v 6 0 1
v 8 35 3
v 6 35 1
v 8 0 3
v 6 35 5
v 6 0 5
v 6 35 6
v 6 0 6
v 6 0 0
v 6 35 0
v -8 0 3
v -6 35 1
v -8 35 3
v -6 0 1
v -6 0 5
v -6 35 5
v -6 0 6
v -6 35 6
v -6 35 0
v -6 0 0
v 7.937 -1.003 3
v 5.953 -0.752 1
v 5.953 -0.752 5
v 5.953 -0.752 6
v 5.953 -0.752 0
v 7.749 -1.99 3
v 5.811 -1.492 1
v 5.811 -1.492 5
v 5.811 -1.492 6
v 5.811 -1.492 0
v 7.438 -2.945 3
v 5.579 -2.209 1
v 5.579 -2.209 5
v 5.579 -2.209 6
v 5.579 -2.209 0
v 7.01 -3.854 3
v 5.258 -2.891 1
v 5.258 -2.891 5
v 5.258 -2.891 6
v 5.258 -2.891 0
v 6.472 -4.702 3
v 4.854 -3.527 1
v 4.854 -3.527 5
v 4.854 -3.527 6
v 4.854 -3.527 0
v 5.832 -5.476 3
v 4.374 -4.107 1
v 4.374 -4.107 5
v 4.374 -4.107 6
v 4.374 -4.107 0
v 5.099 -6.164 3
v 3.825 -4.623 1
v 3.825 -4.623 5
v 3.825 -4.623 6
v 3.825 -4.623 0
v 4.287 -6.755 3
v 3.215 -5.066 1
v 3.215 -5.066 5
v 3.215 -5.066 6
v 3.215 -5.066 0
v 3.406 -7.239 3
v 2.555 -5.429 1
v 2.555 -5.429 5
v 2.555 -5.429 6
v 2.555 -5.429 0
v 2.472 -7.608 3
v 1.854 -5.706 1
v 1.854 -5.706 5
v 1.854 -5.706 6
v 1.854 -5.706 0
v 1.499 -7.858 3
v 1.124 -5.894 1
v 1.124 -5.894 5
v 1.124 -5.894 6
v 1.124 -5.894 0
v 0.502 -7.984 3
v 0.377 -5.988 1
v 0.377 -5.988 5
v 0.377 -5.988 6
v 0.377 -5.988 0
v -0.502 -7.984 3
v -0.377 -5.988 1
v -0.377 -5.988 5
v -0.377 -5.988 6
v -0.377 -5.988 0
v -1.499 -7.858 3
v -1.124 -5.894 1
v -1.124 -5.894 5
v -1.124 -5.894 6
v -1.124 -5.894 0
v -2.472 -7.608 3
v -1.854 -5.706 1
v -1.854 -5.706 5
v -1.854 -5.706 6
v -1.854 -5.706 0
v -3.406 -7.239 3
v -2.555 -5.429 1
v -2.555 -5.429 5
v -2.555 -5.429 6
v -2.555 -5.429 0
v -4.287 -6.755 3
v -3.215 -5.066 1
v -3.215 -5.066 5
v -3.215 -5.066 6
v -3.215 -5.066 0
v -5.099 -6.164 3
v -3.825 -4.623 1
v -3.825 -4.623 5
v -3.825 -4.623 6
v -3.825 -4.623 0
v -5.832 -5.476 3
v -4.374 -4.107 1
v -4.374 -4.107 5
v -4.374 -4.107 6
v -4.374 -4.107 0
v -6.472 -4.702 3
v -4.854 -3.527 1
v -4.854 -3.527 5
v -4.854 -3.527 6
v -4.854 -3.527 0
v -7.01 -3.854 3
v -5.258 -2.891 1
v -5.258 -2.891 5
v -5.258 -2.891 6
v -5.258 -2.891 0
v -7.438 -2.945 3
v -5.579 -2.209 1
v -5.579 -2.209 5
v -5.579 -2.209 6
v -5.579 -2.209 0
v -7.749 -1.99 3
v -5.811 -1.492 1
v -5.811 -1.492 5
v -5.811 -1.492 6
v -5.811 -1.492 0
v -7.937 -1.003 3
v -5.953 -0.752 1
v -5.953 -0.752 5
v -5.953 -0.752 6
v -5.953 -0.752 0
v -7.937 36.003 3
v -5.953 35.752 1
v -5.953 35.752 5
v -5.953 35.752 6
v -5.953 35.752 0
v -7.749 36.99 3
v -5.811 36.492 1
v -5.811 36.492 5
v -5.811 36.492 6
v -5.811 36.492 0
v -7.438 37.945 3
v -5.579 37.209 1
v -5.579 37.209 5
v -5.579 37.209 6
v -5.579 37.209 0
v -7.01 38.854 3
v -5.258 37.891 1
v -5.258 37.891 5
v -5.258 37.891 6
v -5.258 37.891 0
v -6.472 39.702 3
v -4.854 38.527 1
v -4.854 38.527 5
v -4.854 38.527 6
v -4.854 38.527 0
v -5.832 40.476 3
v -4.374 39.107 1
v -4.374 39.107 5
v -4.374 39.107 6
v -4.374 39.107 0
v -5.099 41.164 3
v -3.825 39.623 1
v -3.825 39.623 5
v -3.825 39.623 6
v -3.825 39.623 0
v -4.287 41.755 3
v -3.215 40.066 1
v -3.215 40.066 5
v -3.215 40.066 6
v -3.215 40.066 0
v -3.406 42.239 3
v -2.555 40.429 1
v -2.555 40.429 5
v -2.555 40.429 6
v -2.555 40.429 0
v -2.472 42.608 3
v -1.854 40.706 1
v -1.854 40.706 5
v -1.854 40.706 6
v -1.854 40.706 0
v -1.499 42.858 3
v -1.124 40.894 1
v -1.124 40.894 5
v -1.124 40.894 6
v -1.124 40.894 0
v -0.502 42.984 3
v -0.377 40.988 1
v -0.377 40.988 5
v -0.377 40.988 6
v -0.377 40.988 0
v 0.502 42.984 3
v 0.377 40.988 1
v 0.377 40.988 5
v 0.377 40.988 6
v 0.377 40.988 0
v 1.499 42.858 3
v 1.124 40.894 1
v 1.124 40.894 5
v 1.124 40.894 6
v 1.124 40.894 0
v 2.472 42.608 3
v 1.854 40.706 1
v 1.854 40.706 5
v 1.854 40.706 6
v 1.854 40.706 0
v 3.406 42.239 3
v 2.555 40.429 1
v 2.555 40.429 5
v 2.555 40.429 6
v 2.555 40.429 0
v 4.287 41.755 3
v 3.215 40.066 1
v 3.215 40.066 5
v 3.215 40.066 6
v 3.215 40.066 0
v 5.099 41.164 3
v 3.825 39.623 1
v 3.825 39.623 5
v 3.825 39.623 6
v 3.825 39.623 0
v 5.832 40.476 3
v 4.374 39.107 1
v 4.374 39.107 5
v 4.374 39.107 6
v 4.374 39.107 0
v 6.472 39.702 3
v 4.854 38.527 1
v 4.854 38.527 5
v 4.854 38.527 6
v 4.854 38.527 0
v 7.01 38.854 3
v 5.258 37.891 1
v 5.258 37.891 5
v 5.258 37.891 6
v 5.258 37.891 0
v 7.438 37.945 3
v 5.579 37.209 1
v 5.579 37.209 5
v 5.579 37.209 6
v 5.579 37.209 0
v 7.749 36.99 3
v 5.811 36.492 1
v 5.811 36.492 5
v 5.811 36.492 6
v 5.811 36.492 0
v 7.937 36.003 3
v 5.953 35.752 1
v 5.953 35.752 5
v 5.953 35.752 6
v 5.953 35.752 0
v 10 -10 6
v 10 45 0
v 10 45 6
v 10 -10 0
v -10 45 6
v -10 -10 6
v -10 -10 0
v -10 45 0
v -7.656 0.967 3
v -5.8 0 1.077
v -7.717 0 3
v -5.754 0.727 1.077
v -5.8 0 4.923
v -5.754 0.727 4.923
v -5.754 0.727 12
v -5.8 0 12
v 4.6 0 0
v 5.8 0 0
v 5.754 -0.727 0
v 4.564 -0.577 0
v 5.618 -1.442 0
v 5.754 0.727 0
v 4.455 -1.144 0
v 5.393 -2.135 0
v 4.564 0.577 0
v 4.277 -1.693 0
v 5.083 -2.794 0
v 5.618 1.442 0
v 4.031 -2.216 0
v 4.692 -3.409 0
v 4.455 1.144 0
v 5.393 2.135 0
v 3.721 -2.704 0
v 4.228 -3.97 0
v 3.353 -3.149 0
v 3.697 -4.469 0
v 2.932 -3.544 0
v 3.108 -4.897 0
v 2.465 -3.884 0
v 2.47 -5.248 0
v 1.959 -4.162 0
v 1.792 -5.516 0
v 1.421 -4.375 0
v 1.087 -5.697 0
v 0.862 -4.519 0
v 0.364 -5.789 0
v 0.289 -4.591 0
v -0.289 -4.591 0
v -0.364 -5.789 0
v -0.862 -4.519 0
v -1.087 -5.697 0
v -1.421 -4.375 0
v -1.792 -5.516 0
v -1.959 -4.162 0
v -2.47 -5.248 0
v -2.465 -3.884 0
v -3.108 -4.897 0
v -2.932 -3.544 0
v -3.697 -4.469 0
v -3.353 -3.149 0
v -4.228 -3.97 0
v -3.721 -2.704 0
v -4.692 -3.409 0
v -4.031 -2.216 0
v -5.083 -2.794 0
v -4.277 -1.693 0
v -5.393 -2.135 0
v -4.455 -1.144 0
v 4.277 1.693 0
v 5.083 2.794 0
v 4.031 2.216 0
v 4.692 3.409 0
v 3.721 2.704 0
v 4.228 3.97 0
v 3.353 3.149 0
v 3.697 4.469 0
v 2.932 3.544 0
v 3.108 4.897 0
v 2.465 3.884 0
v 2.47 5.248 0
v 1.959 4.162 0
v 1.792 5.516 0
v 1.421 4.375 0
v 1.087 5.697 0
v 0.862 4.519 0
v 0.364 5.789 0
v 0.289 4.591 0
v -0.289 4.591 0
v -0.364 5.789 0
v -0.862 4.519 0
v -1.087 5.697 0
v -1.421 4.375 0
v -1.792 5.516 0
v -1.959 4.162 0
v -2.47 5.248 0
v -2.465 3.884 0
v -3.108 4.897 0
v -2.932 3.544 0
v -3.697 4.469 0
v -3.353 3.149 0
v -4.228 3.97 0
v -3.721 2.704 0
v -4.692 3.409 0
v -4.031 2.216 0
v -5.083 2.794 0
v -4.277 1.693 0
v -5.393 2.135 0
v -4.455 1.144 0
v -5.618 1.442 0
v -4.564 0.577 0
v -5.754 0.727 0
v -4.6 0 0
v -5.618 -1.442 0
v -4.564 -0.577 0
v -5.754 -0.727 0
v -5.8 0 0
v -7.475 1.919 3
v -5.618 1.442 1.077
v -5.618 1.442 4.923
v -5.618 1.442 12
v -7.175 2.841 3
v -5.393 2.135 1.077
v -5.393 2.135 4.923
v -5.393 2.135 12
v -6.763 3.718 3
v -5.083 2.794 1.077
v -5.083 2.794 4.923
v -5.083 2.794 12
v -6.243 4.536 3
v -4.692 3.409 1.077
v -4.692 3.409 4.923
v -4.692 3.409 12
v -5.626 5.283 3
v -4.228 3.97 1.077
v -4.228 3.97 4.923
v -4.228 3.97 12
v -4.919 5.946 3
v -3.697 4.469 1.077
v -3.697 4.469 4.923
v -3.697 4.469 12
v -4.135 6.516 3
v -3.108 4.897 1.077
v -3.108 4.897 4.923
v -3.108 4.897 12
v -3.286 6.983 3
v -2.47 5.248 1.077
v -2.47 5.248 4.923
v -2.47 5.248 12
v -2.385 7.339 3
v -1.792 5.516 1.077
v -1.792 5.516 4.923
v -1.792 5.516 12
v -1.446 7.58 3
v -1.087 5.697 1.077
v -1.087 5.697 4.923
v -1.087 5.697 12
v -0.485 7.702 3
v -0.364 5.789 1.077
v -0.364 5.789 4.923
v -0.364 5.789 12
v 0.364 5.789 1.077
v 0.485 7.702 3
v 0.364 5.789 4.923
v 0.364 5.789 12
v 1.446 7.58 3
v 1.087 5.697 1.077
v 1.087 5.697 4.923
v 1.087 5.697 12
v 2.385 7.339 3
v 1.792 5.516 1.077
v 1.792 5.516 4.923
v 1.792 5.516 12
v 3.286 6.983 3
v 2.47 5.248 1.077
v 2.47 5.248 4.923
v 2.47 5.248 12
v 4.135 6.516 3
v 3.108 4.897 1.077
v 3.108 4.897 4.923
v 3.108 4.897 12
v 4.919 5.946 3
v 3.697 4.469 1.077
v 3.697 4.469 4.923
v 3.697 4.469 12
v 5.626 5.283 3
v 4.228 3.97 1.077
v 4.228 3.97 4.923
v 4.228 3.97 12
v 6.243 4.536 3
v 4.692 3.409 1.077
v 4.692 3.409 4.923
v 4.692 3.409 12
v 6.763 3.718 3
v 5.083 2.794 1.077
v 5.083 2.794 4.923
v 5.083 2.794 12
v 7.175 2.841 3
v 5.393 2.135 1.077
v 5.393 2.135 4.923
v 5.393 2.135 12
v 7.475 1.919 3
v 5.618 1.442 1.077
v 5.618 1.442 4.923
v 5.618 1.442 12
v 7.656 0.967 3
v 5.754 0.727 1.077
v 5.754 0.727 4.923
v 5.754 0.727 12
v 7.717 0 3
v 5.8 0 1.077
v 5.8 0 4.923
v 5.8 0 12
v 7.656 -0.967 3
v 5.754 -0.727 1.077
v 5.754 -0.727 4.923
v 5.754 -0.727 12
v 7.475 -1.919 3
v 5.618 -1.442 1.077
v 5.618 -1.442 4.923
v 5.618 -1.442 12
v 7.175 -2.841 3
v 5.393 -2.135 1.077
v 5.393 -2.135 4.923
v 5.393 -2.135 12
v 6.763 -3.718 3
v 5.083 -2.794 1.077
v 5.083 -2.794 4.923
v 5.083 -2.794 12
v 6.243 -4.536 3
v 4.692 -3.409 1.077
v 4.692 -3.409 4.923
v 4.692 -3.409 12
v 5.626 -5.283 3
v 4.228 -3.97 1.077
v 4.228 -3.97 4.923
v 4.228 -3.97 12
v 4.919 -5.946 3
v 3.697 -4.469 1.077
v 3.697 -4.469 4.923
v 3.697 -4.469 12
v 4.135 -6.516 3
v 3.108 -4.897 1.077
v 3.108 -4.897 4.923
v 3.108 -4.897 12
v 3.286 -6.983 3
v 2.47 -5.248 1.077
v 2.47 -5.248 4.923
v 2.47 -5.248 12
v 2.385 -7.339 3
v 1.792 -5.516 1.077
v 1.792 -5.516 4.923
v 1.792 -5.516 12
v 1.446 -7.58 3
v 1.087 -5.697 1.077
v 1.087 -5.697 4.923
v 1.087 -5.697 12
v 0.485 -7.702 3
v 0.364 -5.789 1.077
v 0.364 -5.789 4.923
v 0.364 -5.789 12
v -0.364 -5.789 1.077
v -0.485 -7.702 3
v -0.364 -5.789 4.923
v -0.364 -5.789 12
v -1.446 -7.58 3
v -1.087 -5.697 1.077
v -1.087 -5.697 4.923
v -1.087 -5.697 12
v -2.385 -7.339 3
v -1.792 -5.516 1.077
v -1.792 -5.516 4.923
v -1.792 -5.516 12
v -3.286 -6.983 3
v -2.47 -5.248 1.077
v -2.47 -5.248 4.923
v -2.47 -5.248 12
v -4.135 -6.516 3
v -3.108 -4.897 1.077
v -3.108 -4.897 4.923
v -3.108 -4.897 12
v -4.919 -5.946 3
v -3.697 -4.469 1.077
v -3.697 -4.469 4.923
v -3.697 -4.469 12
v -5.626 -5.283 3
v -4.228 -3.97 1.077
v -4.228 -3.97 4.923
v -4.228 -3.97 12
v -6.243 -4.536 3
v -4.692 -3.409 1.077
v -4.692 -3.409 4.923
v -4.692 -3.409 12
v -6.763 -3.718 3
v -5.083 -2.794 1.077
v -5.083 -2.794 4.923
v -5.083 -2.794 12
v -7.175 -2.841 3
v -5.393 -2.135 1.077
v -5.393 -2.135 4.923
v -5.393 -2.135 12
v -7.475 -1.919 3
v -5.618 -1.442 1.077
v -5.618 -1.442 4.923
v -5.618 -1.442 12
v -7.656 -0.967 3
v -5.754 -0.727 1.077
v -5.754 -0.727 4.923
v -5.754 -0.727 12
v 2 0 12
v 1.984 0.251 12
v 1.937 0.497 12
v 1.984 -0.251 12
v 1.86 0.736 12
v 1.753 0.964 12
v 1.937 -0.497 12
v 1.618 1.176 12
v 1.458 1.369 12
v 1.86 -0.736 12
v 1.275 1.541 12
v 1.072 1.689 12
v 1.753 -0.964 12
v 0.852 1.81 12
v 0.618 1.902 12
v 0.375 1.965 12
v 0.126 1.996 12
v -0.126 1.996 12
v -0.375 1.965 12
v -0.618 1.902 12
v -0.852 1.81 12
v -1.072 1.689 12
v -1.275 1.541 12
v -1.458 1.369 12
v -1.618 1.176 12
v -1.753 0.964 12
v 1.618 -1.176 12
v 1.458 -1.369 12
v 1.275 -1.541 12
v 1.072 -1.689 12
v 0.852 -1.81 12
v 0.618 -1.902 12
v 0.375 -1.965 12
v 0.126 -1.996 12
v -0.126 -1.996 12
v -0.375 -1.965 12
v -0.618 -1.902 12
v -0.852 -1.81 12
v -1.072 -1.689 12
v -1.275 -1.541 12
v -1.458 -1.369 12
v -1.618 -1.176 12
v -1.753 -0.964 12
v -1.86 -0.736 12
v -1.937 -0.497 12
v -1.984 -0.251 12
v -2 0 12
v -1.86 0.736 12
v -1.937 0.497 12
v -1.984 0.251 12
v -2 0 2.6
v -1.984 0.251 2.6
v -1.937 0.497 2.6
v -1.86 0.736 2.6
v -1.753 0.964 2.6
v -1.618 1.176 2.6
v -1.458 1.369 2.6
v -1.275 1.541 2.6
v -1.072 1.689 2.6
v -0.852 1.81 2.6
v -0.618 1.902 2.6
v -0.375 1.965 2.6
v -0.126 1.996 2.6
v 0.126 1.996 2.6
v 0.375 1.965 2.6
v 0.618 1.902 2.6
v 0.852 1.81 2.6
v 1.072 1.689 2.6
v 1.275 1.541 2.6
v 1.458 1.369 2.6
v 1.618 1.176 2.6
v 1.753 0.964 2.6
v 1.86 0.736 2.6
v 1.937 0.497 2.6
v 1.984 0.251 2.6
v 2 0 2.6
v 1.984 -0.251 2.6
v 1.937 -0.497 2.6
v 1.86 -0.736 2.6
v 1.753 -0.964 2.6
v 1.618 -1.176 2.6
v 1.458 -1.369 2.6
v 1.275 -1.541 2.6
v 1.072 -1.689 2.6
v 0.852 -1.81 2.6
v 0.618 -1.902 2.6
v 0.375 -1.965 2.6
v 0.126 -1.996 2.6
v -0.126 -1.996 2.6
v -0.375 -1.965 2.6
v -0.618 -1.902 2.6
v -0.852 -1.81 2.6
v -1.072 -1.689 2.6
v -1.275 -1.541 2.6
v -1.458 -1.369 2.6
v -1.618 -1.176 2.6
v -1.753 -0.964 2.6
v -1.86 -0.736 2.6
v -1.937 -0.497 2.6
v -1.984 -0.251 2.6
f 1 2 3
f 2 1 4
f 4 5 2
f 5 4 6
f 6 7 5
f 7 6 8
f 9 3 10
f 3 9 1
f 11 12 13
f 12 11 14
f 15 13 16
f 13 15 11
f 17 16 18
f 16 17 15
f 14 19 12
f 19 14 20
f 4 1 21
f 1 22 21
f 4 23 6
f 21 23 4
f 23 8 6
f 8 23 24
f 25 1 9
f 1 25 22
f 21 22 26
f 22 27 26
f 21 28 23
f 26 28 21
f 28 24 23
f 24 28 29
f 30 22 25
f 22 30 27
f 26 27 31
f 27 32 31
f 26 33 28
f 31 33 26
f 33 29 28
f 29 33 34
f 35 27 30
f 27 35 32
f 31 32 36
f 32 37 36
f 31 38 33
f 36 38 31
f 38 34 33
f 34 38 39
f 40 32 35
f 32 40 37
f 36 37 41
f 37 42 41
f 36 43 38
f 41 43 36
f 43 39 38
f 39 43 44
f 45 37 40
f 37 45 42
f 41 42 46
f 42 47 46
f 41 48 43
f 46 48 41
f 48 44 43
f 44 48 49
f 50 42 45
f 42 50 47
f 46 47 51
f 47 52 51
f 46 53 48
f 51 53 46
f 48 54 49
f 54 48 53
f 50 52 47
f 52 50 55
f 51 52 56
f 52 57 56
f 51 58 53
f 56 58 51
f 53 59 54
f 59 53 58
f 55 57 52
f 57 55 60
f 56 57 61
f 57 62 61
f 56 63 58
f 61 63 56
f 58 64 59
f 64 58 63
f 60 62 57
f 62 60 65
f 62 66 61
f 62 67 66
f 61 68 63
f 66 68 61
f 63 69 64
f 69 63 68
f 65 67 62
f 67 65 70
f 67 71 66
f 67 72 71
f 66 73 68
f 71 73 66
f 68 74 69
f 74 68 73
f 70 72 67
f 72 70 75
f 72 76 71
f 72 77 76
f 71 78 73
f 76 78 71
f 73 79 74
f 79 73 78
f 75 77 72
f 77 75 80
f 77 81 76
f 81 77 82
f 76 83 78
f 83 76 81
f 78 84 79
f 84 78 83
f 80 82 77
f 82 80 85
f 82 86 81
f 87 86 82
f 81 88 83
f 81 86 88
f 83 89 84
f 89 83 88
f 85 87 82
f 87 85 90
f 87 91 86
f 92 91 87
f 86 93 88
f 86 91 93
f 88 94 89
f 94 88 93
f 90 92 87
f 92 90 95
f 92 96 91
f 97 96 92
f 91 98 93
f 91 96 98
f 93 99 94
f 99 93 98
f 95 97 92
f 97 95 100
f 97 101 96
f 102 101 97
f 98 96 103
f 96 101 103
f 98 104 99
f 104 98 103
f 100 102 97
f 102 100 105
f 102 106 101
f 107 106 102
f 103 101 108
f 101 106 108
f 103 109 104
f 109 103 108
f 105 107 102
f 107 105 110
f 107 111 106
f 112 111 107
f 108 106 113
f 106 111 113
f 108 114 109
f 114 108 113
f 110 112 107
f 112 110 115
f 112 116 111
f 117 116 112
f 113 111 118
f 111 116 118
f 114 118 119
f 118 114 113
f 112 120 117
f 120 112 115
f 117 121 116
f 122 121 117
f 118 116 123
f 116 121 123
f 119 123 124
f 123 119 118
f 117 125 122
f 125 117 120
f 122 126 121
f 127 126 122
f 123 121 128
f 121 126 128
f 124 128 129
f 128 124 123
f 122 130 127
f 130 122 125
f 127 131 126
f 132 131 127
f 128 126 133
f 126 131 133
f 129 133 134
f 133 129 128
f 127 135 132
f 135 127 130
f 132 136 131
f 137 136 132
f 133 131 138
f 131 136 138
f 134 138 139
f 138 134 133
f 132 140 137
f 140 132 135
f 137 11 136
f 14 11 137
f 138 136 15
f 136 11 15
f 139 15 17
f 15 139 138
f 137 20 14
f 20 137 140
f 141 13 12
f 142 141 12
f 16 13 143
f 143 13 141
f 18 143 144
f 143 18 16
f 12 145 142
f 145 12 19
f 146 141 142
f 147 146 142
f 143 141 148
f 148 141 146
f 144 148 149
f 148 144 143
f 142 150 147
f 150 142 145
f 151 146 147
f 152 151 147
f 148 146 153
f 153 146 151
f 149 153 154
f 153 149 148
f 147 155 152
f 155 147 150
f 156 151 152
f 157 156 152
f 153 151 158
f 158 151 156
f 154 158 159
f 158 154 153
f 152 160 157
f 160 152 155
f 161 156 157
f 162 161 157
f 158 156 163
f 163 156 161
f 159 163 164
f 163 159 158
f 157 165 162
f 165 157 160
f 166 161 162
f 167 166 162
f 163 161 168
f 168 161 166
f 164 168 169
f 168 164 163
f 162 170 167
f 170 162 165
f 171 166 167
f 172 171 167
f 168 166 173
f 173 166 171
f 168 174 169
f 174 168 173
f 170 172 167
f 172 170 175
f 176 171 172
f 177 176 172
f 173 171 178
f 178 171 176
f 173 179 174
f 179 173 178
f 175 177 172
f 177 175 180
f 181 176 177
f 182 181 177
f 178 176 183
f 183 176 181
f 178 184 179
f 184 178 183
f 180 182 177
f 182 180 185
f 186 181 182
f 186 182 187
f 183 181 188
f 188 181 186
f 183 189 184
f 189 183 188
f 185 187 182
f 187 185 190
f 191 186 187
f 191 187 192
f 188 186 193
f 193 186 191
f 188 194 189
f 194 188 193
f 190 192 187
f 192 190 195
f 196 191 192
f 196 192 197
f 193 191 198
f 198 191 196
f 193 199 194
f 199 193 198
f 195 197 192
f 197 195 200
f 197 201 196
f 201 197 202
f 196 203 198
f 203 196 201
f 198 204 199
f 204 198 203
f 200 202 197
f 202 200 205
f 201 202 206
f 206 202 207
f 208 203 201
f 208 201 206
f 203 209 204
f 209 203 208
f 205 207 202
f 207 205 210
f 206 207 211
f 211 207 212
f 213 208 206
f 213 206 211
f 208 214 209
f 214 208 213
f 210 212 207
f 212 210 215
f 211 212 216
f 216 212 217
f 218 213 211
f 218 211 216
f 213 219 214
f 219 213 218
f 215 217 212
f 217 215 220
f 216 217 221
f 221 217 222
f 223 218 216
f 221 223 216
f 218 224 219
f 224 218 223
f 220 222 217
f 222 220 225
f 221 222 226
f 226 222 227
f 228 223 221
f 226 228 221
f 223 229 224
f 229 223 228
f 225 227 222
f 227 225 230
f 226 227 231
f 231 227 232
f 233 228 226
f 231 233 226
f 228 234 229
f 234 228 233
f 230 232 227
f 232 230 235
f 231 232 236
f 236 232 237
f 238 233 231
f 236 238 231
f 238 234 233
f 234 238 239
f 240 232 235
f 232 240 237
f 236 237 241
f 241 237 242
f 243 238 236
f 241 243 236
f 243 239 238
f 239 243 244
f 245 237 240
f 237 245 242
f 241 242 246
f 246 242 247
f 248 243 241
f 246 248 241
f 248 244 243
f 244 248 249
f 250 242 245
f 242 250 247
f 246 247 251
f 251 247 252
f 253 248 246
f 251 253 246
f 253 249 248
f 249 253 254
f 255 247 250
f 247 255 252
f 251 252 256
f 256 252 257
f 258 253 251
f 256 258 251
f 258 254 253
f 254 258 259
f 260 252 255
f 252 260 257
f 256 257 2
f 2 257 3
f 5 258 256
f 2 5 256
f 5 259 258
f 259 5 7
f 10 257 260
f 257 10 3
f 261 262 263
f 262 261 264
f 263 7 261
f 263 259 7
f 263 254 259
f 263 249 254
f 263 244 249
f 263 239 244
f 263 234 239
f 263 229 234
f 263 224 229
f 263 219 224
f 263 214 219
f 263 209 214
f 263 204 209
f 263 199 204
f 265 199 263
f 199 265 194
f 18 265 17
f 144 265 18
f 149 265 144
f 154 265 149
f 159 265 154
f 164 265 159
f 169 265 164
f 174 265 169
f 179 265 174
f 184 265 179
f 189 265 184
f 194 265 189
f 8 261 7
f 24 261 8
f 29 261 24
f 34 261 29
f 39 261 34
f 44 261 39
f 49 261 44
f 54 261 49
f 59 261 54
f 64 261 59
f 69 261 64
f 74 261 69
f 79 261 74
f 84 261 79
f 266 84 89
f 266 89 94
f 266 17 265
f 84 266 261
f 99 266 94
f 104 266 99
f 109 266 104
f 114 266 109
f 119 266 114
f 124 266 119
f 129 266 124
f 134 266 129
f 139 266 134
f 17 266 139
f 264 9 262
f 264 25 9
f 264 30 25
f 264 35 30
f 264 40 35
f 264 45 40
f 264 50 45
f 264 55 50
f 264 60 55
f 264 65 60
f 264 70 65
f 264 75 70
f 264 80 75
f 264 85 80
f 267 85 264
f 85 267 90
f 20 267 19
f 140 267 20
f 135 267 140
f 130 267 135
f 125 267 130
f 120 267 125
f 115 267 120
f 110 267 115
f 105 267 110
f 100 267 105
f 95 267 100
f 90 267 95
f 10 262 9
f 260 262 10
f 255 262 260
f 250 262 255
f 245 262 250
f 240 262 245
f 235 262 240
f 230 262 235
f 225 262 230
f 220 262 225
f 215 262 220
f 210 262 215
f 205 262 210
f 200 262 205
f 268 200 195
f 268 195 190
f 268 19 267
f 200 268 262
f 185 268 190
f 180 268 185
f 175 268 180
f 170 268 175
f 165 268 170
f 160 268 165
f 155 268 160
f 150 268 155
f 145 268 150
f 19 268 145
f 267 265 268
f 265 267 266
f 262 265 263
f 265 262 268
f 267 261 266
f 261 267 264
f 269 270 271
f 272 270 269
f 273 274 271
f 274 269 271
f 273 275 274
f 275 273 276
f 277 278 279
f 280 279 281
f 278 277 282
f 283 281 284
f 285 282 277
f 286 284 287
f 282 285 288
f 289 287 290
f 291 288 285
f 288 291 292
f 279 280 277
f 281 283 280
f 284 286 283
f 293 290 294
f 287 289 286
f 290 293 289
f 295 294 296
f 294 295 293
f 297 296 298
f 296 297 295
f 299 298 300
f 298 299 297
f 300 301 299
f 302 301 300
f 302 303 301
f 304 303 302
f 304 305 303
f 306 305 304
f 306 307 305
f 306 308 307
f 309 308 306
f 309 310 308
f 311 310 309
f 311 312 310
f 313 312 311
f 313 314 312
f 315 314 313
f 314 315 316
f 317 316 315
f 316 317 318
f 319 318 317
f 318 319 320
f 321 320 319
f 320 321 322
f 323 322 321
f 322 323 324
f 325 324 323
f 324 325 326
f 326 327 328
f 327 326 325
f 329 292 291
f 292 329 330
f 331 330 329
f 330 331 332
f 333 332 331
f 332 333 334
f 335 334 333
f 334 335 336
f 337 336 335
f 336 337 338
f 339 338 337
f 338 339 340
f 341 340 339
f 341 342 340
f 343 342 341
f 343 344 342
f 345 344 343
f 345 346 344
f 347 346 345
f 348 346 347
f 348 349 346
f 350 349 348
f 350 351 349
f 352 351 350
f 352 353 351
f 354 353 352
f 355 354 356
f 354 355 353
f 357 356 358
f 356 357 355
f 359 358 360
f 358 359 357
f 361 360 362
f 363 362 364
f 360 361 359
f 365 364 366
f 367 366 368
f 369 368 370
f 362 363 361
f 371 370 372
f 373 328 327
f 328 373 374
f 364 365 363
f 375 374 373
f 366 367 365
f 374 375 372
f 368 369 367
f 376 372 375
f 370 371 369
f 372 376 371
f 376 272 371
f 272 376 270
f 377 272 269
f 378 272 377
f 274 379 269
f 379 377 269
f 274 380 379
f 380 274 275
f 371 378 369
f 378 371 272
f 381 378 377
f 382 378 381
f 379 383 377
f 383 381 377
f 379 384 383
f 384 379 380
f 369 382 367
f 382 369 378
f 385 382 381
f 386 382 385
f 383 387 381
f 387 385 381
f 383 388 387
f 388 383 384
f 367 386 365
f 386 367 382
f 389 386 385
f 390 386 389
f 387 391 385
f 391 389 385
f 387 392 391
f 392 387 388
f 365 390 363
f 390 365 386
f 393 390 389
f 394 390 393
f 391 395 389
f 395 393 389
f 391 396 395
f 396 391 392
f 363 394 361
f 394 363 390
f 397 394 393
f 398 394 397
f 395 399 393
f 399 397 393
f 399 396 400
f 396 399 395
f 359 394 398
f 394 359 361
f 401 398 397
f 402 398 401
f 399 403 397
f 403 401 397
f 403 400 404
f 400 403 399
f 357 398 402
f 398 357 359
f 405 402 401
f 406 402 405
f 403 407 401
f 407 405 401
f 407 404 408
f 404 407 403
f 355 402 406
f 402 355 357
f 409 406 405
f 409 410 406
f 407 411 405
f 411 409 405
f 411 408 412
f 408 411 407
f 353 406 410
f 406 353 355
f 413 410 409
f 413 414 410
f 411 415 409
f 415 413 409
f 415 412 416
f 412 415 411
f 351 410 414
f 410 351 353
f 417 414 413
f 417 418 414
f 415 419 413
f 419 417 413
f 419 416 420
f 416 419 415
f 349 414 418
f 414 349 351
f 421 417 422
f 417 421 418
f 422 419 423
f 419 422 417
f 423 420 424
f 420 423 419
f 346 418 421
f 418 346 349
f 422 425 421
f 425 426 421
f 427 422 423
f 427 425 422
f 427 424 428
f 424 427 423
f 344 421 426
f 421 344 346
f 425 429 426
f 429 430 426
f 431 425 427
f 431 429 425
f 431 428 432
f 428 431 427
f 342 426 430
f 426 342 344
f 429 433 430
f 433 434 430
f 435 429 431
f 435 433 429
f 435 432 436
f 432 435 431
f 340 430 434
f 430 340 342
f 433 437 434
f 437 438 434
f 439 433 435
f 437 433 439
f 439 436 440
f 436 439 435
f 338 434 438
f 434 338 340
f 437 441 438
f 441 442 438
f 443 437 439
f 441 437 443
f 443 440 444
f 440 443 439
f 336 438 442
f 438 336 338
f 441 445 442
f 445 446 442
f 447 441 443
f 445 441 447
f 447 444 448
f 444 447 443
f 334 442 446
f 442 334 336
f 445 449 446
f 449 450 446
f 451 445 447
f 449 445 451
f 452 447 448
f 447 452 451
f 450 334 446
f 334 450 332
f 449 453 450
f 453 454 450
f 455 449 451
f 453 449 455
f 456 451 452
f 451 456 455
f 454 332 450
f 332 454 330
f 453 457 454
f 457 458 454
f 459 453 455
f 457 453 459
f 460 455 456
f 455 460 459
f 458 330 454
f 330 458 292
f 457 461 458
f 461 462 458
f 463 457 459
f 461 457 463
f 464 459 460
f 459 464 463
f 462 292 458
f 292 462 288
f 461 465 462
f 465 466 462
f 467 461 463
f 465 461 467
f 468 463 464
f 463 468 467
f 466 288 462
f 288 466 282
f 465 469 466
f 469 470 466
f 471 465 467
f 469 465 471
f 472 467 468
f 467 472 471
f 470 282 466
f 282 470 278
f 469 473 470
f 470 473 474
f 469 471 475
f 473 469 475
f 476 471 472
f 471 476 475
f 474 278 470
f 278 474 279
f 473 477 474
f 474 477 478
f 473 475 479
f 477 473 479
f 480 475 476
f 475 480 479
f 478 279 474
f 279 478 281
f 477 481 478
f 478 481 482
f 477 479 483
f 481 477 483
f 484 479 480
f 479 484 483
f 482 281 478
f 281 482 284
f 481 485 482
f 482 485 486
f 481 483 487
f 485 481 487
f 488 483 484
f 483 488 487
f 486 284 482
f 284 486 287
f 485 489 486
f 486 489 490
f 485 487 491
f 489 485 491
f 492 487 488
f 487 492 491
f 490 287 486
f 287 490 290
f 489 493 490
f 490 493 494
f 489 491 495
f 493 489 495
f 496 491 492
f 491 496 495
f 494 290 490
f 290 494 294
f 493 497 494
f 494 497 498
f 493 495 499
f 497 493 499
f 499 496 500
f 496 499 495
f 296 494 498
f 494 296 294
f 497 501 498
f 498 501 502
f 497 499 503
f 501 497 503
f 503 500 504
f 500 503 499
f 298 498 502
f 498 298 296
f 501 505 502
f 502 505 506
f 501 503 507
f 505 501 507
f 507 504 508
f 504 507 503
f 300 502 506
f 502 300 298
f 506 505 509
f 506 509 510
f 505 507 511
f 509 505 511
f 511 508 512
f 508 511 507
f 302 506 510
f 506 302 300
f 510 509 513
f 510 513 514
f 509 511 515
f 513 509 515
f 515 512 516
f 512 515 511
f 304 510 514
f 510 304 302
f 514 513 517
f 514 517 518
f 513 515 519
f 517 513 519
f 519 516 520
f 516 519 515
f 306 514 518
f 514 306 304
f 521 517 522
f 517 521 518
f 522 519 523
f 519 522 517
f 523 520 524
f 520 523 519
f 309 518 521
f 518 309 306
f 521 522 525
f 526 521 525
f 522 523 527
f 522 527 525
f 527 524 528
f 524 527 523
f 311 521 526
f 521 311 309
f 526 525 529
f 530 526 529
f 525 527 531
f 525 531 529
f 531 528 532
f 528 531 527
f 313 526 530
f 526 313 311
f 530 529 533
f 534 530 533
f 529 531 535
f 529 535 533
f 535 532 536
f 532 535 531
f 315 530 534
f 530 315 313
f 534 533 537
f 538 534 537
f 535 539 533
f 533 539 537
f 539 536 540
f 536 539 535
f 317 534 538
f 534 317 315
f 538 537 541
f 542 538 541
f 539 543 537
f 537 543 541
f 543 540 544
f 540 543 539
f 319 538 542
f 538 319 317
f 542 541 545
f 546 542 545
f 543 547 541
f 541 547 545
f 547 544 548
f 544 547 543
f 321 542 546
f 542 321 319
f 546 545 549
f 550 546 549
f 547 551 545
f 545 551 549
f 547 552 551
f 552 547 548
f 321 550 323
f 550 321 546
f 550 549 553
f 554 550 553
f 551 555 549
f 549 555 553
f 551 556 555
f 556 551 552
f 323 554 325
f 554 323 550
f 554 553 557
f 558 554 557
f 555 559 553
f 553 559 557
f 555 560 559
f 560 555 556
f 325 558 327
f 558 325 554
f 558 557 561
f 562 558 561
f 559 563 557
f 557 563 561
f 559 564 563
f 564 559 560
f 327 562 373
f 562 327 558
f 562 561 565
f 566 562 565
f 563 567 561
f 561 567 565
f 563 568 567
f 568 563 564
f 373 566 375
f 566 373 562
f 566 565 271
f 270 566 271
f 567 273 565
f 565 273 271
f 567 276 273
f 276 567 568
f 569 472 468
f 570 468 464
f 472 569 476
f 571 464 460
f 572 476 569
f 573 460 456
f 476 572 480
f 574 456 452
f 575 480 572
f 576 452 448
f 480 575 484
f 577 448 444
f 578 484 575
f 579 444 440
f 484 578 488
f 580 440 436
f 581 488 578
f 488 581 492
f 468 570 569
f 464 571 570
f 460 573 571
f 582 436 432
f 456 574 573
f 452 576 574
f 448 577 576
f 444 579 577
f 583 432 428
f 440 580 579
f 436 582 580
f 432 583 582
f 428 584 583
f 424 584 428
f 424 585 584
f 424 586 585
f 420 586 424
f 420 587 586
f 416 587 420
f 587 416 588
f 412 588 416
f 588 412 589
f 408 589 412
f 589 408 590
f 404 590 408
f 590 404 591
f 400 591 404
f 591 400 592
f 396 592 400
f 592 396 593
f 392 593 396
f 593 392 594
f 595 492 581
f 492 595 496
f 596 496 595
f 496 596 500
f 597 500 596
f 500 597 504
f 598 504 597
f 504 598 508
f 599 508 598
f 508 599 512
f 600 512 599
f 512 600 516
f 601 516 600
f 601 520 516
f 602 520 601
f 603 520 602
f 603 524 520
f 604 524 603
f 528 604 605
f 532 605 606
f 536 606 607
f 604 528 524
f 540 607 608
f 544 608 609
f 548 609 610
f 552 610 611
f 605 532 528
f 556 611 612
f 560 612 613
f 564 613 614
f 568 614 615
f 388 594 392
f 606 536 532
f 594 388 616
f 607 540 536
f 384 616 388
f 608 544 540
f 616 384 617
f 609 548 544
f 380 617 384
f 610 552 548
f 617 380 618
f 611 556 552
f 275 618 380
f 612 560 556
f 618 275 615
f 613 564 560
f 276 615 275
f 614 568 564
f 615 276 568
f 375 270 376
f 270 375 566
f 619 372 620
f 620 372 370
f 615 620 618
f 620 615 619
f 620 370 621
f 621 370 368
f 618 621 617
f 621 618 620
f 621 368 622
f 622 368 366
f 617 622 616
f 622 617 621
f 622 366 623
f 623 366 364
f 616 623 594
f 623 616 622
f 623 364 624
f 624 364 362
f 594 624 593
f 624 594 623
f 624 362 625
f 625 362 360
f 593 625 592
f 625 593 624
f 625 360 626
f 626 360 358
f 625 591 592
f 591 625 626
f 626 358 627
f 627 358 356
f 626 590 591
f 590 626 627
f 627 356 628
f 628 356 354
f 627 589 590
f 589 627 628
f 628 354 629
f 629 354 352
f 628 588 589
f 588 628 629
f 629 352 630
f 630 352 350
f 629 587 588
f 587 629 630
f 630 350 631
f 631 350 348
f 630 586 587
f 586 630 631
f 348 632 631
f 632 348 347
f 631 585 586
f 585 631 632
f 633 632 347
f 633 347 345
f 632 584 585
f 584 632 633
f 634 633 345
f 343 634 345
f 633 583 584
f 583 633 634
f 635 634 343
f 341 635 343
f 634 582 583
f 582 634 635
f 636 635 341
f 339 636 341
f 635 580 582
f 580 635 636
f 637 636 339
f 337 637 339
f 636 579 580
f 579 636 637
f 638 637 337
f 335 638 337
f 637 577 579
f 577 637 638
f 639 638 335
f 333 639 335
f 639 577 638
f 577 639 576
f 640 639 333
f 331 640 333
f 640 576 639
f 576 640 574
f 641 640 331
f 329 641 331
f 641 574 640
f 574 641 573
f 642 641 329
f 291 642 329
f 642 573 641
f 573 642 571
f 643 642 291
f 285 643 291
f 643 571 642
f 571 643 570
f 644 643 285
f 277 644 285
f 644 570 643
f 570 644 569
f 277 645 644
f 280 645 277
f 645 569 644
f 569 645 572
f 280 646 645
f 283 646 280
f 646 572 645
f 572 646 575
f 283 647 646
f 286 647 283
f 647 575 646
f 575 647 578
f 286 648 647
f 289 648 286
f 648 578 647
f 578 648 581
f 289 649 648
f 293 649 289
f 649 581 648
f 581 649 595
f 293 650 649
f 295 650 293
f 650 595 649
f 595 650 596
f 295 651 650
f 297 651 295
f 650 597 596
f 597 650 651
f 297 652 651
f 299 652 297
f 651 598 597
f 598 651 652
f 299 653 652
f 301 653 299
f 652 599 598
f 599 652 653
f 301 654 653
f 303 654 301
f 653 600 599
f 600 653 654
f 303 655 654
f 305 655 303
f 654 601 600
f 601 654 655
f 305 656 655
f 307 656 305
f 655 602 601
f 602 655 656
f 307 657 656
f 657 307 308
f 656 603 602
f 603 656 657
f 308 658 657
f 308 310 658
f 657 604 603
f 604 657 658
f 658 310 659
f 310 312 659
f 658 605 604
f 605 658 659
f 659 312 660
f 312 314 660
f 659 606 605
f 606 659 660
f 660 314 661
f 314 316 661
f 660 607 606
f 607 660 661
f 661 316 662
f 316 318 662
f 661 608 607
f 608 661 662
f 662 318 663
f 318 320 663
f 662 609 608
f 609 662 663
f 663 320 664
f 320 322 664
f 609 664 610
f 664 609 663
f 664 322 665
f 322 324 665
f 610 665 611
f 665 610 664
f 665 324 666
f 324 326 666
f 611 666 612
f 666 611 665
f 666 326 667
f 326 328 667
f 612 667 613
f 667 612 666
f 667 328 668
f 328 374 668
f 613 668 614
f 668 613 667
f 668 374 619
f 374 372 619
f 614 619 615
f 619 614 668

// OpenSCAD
/*
Sliding Bolt
https://github.com/danmarshall/openscad-sliding-bolt
License: Apache 2.0
*/

module slidingbolt(travel, radius, height, lip, clearance, bolt_radius, flathead_radius, standoff, action) {
	$fn = 50;
	h2 = height / 2;
	h2l = h2 - lip;
	o = radius + h2 + 1;

	function flathead() = [
		[0, -1],
		[bolt_radius + flathead_radius, -1],
		[bolt_radius + flathead_radius, 0],
		[bolt_radius, flathead_radius],
		[bolt_radius, height + standoff + 1],
		[0, height + standoff + 1],
	];

	function profile(use_clearance, use_overlap, standoff) = [
		[0, -use_overlap], 
		[radius - use_clearance, -use_overlap], 
		[radius - use_clearance, lip + sin(22.5) * use_clearance],
		[radius + h2l - use_clearance * sqrt(2), h2],
		[radius - use_clearance, height - lip - sin(22.5) * use_clearance],
		[radius - use_clearance, height + use_overlap + standoff],
		[0, height + use_overlap + standoff]
	];

	module track() {
		module halftrack() {
			translate([0, travel, 0]){
				rotate([90, 0, 0]) {
					linear_extrude(height = travel) {
						polygon(points=profile(0, 1, 0));
					}
				}
			}
		}

		halftrack();
		mirror([1, 0, 0]) {
			halftrack();
		}
		rotate_extrude(height = height) {
			polygon(points=profile(0, 1, 0));
		}
		translate([0, travel, 0]) {
			rotate_extrude(height = height) {
				polygon(points=profile(0, 1, 0));
			}
		}
	}

	module sliderbolt() {
		difference() {
			rotate_extrude(height = height) {
				polygon(points=profile(clearance, 0, standoff));
			}
			rotate_extrude(height = height) {
				polygon(points=flathead());
			}
		}
	}

	if (action == "bolt") {
		sliderbolt();
	} else if (action == "track") {
		track();
	} else {
		difference() {
			translate([-o, -o, 0]) {
				cube([2 * o, 2 * o + travel, height]);
			}
			track();
		}

		sliderbolt();
	}
}

travel = 35;
radius = 6;
height = 6;
lip = 1;
bolt_radius = 2;
flathead_radius = 2.6;
clearance = 0.2;
standoff = 6;

slidingbolt(travel, radius, height, lip, clearance, bolt_radius, flathead_radius, standoff);
